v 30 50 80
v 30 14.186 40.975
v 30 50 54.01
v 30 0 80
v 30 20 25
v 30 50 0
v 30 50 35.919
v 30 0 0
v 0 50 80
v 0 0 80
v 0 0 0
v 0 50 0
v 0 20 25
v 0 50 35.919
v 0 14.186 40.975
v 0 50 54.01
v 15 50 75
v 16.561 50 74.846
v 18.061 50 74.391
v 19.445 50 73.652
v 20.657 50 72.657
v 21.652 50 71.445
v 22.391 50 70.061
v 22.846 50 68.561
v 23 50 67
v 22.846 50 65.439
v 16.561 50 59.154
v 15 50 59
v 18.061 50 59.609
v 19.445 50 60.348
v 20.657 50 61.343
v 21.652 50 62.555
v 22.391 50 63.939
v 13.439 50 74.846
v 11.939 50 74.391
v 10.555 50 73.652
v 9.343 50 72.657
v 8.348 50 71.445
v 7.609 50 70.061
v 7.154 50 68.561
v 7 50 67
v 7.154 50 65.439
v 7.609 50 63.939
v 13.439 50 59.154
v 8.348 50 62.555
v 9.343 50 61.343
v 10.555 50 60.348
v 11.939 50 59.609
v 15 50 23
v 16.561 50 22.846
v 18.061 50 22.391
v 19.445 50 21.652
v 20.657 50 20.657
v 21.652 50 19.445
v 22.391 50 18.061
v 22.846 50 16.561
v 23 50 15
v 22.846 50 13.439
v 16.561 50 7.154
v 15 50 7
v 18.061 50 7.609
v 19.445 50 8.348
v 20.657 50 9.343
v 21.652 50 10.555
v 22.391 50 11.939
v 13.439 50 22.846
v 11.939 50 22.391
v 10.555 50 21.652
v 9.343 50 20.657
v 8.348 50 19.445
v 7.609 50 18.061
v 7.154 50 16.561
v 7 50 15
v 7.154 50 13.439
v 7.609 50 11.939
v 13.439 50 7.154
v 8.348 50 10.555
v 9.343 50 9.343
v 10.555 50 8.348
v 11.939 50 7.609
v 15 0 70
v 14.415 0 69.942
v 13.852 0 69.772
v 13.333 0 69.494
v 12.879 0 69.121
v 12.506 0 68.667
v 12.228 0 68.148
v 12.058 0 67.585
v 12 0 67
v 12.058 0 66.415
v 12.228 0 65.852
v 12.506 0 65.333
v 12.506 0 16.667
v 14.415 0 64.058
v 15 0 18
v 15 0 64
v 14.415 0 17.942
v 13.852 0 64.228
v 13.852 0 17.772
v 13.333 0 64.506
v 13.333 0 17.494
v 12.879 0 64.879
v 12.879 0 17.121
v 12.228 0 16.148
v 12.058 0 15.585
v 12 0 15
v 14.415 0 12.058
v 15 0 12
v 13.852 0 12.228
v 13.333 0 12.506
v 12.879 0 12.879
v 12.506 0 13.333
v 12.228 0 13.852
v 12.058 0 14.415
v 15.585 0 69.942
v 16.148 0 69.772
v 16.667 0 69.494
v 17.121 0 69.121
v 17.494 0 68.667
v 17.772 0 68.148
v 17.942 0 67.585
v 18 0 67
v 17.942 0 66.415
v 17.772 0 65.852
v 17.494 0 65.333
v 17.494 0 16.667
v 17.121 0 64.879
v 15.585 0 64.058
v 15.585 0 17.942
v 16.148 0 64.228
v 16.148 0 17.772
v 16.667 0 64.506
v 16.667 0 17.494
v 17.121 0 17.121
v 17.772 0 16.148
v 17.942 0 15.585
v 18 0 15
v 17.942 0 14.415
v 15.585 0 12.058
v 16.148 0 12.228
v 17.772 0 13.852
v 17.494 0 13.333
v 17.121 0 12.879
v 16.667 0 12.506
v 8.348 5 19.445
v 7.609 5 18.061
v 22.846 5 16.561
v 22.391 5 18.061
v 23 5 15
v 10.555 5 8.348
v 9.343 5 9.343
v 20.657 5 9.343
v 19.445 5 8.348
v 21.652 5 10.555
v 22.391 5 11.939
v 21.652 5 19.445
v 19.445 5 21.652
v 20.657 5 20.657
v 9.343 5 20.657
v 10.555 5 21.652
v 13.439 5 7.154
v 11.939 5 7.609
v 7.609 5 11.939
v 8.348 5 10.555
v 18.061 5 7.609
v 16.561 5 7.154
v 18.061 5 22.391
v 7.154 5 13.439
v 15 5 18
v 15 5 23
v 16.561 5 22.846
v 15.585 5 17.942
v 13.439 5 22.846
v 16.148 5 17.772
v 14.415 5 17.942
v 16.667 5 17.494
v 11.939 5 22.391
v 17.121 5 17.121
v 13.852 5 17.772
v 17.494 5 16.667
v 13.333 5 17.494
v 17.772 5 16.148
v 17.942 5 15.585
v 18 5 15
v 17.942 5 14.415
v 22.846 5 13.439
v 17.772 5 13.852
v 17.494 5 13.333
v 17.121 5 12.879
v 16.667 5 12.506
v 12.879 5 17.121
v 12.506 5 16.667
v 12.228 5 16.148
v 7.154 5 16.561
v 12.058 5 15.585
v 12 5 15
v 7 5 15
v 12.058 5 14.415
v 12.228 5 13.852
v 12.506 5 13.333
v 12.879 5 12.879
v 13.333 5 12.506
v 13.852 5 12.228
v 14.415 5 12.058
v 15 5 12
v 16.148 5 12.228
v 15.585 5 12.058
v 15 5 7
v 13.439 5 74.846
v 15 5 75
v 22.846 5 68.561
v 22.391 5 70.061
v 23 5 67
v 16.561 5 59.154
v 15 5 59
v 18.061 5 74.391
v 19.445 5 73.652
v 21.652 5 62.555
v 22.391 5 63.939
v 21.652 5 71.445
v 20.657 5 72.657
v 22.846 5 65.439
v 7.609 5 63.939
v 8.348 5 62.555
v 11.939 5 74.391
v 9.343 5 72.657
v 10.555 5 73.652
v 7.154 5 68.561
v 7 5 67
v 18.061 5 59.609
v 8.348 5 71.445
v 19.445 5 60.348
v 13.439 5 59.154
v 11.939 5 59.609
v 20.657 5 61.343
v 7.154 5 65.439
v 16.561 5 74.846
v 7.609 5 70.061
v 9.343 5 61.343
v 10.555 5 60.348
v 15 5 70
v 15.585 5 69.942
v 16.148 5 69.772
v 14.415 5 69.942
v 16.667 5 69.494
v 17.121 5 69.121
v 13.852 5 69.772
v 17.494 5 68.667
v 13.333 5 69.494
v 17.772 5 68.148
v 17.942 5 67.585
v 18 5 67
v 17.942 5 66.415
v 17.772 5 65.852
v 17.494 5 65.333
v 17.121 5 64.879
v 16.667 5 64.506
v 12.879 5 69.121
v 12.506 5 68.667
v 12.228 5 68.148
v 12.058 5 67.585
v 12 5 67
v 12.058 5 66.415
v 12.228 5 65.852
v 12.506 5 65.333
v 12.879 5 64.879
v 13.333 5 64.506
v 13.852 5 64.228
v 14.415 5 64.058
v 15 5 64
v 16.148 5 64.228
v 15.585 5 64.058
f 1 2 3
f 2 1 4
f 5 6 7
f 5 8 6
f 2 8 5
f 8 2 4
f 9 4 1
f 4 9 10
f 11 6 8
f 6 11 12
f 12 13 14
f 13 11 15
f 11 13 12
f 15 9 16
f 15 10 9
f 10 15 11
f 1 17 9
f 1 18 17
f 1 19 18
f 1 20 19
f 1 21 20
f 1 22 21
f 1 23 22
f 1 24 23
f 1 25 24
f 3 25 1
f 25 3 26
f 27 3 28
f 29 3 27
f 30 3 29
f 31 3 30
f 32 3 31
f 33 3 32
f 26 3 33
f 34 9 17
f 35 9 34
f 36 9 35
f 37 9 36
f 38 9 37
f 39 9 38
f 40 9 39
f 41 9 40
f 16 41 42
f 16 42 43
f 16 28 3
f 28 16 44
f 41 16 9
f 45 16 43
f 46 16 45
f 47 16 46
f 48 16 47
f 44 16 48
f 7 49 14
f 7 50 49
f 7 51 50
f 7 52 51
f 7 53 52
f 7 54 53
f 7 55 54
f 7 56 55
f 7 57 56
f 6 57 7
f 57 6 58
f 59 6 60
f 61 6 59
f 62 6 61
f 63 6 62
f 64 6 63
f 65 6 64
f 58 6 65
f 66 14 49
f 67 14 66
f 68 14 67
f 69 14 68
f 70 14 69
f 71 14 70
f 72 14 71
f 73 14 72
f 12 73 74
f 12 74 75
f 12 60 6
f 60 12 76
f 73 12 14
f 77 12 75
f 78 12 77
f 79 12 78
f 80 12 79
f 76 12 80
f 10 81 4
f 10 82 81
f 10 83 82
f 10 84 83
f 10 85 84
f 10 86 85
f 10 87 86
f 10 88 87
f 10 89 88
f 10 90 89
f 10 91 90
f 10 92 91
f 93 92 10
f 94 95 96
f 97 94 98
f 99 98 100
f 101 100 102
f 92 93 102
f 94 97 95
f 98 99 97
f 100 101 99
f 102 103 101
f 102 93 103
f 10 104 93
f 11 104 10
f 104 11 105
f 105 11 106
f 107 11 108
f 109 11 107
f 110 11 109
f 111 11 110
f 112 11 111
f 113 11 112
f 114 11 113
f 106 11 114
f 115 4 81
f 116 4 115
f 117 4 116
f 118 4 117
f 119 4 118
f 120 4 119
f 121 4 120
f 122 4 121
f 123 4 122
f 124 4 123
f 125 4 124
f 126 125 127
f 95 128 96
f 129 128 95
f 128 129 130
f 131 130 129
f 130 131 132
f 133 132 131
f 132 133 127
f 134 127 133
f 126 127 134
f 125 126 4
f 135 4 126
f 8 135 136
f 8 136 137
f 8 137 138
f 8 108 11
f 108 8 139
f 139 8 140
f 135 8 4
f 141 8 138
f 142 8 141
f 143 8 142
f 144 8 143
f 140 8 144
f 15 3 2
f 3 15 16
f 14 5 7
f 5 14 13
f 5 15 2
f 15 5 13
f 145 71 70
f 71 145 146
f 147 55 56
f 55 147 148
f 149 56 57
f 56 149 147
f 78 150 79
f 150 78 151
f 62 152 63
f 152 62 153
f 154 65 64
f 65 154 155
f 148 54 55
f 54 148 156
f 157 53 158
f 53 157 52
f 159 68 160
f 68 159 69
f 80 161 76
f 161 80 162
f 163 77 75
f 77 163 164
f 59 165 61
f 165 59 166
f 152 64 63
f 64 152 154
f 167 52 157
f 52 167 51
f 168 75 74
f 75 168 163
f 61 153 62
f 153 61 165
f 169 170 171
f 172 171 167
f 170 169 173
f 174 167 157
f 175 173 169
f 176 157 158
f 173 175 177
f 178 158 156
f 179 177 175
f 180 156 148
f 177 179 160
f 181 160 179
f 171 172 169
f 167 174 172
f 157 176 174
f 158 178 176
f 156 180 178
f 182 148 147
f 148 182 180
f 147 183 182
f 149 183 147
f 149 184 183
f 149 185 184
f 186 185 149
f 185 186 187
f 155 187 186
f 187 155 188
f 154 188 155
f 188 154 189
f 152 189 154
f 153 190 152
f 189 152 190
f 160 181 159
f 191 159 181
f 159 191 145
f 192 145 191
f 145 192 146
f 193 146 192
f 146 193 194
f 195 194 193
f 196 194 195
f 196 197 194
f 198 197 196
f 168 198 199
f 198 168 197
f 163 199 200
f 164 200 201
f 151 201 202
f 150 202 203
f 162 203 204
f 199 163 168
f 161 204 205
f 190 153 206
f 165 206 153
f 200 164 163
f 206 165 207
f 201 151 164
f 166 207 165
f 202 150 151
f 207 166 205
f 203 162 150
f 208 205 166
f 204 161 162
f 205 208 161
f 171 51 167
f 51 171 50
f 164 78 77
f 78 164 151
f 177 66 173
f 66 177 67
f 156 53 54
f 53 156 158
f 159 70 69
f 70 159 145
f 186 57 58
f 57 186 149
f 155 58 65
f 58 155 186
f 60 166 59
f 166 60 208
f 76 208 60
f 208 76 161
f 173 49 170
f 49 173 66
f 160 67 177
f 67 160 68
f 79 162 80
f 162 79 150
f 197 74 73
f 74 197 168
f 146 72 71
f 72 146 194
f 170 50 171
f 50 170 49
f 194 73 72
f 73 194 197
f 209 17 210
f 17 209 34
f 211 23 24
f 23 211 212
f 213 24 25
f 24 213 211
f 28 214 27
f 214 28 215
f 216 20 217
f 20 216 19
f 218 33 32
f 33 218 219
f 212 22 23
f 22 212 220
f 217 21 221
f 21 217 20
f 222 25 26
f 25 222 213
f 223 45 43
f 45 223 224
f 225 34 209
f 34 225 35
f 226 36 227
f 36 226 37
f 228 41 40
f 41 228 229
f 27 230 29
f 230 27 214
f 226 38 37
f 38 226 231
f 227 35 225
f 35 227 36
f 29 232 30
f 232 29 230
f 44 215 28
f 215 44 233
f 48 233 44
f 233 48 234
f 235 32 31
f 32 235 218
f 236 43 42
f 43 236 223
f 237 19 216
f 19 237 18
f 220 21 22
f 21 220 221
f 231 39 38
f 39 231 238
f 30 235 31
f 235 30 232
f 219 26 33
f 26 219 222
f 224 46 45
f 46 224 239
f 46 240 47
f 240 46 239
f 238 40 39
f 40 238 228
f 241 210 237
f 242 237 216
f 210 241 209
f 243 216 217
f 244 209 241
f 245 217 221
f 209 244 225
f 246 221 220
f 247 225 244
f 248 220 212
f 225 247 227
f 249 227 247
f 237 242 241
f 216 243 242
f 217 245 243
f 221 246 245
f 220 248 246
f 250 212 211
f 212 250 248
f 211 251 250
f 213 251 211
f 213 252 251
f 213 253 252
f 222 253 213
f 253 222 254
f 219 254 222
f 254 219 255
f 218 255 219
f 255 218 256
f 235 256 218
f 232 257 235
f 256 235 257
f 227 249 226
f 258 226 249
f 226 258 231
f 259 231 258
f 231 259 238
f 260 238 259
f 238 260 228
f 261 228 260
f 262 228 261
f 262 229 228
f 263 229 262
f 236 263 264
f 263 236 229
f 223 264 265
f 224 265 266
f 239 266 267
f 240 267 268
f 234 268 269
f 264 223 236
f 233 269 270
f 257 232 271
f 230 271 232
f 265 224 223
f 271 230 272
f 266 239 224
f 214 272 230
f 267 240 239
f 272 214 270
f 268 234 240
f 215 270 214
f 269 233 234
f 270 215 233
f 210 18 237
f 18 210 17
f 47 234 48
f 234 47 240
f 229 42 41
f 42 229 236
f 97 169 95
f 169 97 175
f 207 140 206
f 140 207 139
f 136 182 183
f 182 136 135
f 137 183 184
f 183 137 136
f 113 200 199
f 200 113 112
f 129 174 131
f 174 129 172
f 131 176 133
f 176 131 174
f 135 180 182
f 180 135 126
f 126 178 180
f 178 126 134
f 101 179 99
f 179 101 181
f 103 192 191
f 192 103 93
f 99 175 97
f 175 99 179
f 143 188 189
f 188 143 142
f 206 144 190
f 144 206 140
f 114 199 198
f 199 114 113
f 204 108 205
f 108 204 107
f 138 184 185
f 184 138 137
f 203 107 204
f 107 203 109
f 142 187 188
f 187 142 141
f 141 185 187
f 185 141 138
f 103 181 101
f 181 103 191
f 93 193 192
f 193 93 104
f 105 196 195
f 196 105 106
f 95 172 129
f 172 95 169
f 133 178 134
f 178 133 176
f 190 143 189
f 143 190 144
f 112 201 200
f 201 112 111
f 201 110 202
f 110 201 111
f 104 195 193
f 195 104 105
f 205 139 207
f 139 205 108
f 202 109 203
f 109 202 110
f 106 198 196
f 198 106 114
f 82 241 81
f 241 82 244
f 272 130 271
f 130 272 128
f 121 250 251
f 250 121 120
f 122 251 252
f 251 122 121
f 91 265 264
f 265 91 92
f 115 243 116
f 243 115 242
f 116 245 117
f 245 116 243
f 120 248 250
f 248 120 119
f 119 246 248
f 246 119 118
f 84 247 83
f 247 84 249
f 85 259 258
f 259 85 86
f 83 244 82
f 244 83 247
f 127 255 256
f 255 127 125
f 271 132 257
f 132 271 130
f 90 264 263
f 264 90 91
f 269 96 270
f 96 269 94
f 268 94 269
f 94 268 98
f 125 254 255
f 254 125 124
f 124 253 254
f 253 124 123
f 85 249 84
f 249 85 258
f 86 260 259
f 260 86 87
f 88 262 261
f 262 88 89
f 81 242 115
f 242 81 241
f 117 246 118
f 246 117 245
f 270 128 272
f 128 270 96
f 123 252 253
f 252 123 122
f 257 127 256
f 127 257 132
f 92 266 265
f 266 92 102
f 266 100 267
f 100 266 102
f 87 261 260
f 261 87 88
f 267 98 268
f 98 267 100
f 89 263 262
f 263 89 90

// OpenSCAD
// board-holder

thickness = 17;
width = 30;

difference(){
    cube([width, 50, 80]);
    
    // skateboard
    translate([-225, 20, 25])
    rotate([20, 0,0])
    cube([500, 150, thickness]);
    
    translate([width/2, 105, 15])
    rotate([90,0,0])
    cylinder(r=8, h=100, $fn=32);
    
    translate([width/2, 105, 67])
    rotate([90,0,0])
    cylinder(r=8, h=100, $fn=32);   
   
    translate([width/2, 99, 15])
    rotate([90,0,0])
    cylinder(r=3, h=100, $fn=32); 
    
    translate([width/2, 99, 67])
    rotate([90,0,0])
    cylinder(r=3, h=100, $fn=32);    
    
}
